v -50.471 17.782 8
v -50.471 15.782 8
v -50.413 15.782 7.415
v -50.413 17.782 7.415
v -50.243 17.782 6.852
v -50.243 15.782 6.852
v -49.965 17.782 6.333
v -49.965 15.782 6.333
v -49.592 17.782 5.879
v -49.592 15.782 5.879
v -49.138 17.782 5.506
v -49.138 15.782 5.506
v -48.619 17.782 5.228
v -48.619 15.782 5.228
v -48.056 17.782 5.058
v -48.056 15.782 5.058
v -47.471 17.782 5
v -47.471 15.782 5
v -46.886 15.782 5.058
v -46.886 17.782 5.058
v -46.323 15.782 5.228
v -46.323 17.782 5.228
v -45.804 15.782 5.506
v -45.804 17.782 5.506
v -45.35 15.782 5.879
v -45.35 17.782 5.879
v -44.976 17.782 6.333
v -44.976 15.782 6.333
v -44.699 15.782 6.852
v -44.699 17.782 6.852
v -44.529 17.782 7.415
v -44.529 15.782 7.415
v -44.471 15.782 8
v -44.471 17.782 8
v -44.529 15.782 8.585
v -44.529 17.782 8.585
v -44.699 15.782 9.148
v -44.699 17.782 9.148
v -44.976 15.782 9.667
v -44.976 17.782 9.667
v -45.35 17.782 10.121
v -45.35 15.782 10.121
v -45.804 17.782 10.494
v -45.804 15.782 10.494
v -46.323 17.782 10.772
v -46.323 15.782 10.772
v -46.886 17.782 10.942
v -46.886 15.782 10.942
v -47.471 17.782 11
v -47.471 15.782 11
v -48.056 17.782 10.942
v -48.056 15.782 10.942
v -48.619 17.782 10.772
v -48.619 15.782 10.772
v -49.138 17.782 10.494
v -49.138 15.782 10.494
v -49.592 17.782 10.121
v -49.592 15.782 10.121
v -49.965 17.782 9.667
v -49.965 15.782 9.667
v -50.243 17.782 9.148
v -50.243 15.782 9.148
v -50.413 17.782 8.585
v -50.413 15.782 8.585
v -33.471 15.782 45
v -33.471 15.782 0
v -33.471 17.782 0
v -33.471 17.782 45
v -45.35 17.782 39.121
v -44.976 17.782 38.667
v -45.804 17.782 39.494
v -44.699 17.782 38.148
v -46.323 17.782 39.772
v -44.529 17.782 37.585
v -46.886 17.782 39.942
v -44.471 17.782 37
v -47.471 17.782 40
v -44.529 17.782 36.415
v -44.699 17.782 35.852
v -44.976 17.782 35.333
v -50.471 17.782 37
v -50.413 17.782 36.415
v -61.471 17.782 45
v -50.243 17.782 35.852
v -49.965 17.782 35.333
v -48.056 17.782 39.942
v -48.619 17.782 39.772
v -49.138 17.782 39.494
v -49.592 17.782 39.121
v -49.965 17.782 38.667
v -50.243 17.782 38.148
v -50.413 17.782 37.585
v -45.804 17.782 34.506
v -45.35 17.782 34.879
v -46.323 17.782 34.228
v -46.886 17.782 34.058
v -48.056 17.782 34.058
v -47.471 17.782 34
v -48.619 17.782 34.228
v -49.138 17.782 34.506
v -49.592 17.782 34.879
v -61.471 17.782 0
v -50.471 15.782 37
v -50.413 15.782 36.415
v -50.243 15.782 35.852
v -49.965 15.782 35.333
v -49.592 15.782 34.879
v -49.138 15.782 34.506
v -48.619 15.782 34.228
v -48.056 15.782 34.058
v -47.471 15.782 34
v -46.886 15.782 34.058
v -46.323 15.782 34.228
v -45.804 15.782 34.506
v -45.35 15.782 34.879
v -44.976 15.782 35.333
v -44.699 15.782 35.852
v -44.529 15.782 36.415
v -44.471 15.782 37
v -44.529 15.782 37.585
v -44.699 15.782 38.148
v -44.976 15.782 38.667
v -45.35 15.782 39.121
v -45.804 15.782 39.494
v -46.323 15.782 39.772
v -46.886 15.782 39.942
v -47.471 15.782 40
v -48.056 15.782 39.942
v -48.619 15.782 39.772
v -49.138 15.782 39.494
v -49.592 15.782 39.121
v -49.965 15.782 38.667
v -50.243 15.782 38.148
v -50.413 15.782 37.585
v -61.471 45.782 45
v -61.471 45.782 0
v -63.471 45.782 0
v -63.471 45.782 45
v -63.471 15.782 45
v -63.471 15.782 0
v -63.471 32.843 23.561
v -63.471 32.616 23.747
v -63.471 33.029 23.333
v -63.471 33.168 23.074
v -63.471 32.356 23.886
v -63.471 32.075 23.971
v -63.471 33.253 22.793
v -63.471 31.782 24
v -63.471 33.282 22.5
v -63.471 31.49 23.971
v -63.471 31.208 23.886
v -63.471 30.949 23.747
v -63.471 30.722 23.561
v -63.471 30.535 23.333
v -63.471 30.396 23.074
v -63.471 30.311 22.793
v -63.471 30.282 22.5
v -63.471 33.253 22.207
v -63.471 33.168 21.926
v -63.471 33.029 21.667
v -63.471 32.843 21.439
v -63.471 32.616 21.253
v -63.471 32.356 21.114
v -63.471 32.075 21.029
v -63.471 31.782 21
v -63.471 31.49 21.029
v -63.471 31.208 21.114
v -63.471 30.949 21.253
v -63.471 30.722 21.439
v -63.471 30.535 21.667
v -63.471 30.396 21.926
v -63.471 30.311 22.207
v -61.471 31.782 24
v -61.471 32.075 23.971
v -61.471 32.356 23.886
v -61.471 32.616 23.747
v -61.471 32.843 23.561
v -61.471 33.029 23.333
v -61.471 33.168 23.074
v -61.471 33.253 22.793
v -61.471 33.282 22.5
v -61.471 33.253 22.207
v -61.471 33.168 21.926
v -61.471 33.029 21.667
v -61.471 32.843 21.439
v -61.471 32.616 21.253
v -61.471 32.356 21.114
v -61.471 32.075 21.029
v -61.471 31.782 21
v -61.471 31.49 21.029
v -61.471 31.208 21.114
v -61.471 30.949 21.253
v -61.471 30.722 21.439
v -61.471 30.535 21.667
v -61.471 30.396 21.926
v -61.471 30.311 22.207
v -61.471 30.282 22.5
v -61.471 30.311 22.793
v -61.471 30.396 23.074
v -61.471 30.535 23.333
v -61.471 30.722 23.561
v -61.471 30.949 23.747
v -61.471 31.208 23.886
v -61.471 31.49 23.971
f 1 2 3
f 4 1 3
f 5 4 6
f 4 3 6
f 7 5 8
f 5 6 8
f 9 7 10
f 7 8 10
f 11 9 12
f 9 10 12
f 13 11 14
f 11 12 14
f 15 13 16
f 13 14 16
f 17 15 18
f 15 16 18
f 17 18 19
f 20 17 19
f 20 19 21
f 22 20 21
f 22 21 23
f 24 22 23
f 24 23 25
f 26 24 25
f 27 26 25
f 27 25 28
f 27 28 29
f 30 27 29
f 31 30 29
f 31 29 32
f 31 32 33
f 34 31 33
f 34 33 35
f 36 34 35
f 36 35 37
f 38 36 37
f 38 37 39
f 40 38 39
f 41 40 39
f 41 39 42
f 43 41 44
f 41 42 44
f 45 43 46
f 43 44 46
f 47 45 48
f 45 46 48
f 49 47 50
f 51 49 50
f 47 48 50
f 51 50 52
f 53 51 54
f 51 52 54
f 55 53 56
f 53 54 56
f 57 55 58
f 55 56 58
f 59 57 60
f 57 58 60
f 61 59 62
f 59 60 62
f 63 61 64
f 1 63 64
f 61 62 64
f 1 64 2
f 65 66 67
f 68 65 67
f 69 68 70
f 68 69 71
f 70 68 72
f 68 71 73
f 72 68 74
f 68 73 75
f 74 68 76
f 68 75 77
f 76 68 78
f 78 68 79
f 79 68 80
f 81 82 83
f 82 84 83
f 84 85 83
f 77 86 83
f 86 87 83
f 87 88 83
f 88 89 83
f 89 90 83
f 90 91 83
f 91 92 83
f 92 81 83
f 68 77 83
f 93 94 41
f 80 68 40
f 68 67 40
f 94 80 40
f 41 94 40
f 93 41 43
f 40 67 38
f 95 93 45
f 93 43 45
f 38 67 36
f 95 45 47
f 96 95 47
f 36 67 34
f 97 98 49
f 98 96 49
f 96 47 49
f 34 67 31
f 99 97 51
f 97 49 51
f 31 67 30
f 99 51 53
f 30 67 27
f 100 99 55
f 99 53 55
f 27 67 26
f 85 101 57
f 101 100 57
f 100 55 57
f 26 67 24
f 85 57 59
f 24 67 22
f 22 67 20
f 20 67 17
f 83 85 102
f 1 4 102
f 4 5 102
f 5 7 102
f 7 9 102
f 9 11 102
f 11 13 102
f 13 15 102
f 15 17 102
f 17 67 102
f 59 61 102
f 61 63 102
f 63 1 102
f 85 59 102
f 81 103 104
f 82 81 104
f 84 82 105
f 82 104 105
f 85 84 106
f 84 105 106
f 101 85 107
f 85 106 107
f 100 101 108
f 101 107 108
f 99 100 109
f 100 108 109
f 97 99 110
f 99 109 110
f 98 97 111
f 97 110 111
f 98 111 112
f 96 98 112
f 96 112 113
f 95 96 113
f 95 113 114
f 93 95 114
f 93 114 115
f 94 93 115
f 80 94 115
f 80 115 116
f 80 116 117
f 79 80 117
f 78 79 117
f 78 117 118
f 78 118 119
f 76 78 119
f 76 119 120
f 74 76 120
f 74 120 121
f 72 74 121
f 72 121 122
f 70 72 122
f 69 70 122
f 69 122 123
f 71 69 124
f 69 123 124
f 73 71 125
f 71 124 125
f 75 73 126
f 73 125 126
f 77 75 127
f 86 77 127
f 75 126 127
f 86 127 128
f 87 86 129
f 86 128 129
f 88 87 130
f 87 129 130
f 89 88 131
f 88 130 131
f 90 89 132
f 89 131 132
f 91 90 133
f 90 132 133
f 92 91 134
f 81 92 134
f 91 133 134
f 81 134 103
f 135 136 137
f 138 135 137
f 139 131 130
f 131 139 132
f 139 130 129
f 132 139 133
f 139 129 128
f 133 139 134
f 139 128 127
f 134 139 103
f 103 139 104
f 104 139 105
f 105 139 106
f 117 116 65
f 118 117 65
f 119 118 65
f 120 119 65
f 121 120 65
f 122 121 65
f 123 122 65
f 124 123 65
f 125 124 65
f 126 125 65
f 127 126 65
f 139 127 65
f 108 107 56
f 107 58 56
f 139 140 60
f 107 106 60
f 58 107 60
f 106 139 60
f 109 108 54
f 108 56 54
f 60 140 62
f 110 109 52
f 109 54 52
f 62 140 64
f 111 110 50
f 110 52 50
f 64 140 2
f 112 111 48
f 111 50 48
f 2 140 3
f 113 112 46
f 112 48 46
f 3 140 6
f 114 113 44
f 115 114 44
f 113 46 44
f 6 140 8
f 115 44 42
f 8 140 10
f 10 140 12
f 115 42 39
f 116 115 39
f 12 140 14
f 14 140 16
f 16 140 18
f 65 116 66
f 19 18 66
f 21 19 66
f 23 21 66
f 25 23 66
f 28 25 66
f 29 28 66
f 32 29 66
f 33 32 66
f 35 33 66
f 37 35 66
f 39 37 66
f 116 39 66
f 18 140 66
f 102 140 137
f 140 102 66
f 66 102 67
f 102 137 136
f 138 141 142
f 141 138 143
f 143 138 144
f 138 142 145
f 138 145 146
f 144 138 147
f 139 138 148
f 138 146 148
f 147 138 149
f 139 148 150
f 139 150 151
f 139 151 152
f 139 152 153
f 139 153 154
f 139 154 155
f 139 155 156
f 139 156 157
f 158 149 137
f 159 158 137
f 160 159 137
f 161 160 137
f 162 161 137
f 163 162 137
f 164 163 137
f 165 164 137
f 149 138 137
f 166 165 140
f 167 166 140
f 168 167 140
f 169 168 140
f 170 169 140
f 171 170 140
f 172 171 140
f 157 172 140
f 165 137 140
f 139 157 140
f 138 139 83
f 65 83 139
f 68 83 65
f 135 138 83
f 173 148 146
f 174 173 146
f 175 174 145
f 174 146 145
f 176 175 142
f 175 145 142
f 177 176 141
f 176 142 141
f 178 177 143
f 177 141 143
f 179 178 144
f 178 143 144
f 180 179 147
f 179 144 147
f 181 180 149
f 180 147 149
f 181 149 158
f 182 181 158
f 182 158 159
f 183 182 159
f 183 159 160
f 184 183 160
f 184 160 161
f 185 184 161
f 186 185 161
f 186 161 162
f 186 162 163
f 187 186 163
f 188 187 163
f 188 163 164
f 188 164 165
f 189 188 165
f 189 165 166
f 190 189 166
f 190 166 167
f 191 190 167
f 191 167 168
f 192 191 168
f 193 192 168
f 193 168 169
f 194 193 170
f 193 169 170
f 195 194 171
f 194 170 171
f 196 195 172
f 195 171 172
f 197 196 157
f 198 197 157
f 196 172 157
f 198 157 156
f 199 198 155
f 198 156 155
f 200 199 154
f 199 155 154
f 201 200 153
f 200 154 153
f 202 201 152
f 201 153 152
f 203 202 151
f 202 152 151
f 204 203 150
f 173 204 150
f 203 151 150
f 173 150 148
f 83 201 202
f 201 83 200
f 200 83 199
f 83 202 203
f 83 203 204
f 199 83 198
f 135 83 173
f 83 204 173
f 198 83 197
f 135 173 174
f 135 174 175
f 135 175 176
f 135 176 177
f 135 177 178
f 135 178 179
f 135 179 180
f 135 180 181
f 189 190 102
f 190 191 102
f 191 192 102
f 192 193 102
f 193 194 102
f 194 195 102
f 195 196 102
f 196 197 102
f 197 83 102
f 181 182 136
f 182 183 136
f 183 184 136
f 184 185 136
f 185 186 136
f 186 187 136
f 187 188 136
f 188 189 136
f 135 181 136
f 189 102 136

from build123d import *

# Parameters (mm, degrees)
P_IDAT_VYSUNUT_M1_DEPTH       = 45
D_RY_PRO_KOL_K_VELIKOST_MM1_D = 6
D_RY_PRO_KOL_K_VELIKOST_MM2_D = 3


with BuildPart() as part:
    # Skica1 → Přidat vysunutím1 (new body)
    with BuildSketch(Plane.XY):
        Polygon((-63.470895832, 45.782217357), (-63.470895832, 15.782217357), (-33.470895832, 15.782217357), (-33.470895832, 17.782217357), (-61.470895832, 17.782217357), (-61.470895832, 45.782217357), align=None)
    extrude(amount=P_IDAT_VYSUNUT_M1_DEPTH)

    # Díry pro kolík, velikost mm1 (through all)
    with Locations(Plane(origin=(0, 17.782217357, 0), x_dir=(1, 0, 0), z_dir=(0, 1, 0))):
        with Locations((-47.470895832, -37), (-47.470895832, -8)):
            Hole(D_RY_PRO_KOL_K_VELIKOST_MM1_D / 2)

    # Díry pro kolík, velikost mm2 (through all)
    with Locations(Plane(origin=(-61.470895832, 0, 0), x_dir=(0, 0, -1), z_dir=(1, 0, 0))):
        with Locations((-22.5, 31.782217357)):
            Hole(D_RY_PRO_KOL_K_VELIKOST_MM2_D / 2)


solid = part.part
